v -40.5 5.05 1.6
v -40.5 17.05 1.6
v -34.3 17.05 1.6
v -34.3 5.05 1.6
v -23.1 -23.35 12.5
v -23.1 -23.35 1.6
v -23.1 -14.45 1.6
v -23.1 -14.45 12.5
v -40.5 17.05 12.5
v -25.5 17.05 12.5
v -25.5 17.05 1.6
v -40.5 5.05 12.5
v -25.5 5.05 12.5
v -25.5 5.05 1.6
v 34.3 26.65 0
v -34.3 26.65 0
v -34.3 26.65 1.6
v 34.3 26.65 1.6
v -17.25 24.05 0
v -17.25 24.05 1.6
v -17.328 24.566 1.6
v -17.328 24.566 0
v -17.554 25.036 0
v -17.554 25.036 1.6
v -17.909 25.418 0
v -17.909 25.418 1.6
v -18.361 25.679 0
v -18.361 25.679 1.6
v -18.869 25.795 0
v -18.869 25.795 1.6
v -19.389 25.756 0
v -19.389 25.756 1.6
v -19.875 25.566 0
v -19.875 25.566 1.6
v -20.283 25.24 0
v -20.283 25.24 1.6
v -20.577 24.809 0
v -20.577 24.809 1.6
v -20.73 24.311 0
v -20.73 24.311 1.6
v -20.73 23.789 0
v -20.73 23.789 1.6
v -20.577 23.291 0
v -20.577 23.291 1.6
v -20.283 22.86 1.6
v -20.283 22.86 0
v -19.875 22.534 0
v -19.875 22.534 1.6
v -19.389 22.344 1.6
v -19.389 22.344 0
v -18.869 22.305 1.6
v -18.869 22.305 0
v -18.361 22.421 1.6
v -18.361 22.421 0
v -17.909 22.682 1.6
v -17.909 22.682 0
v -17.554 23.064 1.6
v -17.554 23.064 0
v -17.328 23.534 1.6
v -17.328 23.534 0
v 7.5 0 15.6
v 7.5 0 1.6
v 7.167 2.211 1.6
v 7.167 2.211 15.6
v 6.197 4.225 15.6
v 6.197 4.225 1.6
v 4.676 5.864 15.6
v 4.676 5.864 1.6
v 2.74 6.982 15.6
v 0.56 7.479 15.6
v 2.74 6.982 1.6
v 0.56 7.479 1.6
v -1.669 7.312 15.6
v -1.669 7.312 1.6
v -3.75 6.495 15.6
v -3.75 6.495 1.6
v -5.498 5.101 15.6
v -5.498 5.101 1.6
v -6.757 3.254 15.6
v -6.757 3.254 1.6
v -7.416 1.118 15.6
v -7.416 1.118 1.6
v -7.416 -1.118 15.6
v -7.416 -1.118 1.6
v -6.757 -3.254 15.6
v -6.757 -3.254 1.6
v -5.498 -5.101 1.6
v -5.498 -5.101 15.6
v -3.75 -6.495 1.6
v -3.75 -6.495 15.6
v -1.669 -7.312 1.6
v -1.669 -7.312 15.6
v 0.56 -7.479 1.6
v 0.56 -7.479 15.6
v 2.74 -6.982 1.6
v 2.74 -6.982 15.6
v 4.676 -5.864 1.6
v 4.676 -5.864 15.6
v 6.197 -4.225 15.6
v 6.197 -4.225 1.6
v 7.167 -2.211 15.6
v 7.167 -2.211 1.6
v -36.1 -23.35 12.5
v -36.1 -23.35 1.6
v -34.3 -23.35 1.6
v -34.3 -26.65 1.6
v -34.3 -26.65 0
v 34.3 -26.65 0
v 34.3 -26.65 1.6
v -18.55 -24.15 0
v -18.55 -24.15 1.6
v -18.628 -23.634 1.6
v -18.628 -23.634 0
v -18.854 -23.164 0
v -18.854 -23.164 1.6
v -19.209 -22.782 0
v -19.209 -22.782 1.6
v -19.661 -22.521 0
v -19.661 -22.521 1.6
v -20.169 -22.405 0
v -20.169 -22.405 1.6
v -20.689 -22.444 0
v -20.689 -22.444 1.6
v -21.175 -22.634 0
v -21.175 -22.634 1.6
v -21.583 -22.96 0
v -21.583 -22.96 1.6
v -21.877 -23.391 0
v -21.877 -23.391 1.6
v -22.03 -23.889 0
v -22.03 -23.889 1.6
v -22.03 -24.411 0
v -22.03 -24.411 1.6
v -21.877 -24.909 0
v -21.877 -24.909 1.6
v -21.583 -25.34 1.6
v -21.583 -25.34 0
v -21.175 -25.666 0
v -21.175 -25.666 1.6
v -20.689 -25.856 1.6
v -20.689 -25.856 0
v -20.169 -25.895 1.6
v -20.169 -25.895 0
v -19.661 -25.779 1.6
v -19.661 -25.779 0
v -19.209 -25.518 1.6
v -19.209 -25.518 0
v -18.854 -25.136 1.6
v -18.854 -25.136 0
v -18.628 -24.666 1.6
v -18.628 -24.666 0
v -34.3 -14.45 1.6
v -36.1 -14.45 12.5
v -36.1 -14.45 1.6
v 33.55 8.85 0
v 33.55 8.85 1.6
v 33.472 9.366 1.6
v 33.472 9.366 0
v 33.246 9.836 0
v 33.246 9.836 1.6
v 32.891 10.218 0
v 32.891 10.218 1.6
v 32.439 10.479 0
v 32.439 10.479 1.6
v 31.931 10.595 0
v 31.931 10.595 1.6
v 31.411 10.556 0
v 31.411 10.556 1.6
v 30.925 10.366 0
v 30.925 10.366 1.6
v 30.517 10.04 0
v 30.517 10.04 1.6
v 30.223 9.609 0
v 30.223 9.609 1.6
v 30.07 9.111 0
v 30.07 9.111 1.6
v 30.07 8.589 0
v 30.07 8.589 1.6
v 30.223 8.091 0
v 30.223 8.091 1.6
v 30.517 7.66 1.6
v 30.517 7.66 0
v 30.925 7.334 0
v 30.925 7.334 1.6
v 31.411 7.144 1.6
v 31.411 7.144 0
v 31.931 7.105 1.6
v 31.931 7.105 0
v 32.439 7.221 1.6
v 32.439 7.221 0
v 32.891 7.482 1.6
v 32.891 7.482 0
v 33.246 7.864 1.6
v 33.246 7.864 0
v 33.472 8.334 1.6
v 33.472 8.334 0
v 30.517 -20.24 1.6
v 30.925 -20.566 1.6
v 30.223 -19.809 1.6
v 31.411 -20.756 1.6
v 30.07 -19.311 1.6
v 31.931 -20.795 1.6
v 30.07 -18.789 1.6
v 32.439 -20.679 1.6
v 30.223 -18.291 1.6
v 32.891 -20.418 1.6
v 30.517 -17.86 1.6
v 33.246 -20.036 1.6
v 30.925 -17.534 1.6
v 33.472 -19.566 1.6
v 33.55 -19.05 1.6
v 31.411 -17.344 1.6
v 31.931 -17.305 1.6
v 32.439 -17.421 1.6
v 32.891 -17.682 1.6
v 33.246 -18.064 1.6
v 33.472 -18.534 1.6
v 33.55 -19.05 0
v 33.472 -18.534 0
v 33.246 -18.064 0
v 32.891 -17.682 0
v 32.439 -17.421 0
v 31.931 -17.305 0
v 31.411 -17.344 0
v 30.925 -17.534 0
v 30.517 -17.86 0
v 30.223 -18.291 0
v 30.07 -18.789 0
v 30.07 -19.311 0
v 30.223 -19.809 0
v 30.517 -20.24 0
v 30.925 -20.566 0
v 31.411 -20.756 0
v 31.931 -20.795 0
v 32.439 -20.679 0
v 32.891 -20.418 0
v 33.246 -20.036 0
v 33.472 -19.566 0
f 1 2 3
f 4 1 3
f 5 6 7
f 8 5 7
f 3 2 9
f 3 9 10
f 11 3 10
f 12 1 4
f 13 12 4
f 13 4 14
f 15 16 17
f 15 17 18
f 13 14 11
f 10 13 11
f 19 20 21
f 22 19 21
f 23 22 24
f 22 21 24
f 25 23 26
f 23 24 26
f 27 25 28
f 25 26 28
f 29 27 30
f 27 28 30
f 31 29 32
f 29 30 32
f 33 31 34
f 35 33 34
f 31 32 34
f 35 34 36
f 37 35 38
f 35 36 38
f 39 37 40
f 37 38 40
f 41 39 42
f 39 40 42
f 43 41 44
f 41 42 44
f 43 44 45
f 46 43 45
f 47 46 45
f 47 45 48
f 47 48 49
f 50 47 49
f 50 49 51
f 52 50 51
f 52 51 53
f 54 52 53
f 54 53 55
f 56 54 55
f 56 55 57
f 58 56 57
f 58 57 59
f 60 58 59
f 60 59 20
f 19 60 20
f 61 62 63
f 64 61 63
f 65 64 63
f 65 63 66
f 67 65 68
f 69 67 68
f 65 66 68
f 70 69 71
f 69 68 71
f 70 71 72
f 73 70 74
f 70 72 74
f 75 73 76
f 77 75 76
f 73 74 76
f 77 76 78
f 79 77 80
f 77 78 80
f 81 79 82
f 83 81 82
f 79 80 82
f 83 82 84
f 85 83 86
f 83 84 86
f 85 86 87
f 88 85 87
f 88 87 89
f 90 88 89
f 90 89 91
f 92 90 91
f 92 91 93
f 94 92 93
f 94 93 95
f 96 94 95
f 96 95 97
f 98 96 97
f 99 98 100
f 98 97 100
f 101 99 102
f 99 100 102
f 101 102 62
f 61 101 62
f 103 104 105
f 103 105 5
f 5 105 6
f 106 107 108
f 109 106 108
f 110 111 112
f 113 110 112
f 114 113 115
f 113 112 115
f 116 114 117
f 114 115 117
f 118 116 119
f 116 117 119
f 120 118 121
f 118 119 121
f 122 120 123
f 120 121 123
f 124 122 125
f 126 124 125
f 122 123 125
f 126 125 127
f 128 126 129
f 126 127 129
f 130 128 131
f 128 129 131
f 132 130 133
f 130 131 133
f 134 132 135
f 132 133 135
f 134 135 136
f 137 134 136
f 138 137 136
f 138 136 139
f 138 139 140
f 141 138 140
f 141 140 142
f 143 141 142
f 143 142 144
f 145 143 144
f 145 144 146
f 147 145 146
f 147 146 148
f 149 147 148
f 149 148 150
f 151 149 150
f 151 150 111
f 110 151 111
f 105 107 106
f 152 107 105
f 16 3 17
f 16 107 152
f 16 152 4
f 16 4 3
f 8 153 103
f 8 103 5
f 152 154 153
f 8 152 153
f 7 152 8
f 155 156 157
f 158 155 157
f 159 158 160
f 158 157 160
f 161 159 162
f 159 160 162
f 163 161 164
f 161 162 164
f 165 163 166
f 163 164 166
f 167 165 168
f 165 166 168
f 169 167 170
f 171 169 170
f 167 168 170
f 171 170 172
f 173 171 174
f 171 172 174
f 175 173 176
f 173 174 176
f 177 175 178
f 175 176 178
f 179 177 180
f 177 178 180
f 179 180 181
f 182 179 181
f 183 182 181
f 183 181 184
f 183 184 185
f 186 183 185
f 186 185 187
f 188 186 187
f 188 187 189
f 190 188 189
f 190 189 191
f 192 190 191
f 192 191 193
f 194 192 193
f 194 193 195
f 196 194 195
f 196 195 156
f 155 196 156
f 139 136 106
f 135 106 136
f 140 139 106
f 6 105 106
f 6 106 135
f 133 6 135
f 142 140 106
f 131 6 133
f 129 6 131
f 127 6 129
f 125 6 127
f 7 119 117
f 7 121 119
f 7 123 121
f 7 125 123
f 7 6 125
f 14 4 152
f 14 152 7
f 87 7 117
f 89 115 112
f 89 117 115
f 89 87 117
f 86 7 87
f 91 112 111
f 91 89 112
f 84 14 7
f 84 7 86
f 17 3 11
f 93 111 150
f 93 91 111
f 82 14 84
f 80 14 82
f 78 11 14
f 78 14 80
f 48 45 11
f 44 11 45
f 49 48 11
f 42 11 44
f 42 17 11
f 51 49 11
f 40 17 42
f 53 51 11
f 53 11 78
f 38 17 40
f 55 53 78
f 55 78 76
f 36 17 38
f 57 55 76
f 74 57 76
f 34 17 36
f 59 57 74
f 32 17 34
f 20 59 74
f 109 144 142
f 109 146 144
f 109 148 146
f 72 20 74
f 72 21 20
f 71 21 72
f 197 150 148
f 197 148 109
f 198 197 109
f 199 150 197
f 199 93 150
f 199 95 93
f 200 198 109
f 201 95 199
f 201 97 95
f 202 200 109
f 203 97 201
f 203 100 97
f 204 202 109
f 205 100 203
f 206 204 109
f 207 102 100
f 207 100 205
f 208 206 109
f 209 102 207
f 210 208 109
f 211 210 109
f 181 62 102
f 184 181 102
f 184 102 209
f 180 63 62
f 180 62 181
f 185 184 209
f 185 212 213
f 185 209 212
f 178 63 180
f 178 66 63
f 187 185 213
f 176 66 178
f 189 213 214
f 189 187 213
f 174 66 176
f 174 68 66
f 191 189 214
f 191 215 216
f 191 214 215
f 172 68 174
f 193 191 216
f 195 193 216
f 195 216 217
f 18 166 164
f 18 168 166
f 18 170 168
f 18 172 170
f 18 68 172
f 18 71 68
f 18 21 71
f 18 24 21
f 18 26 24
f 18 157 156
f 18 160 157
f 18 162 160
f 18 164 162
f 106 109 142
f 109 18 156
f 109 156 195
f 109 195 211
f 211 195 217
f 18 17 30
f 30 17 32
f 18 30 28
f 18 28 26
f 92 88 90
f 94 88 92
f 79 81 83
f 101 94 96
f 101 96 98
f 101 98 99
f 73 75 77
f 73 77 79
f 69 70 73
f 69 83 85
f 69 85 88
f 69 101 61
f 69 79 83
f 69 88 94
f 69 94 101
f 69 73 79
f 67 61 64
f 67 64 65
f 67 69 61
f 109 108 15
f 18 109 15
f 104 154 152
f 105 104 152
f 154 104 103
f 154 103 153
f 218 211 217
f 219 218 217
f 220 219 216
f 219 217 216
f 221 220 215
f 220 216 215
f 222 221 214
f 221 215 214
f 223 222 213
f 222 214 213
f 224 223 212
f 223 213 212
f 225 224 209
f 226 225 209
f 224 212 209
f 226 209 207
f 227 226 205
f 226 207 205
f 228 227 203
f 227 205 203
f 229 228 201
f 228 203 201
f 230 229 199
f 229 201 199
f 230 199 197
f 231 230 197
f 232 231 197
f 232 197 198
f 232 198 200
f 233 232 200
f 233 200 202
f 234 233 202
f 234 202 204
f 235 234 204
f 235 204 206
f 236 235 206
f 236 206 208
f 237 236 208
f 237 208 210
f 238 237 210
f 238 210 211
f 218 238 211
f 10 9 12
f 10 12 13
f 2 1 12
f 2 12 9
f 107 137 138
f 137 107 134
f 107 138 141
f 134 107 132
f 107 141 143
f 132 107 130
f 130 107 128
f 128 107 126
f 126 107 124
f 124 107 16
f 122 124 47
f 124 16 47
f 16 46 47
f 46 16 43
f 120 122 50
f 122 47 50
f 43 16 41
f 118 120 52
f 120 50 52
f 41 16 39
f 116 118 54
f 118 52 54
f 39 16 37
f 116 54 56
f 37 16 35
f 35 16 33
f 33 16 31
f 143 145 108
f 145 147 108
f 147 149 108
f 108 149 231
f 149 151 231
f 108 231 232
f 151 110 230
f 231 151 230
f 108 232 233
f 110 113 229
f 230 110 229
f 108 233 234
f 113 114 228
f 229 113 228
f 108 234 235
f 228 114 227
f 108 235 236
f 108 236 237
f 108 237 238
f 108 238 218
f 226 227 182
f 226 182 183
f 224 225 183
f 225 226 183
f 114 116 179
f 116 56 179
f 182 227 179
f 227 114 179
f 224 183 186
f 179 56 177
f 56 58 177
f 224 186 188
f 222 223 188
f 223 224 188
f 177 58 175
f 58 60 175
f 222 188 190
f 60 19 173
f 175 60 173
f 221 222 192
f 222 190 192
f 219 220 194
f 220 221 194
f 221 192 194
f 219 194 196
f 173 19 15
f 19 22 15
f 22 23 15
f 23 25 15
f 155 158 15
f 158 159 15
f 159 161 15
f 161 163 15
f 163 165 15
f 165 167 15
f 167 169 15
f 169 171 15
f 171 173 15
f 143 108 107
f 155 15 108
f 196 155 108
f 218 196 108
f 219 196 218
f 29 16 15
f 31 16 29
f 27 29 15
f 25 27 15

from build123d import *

# Parameters (mm, degrees)
SKETCH1_W           = 68.6
SKETCH1_H           = 53.3
BOSS_EXTRUDE1_DEPTH = 1.6
SKETCH2_W           = 15
SKETCH2_H           = 12
SKETCH2_W_2         = 13
SKETCH2_H_2         = 8.9
BOSS_EXTRUDE2_DEPTH = 10.9
SKETCH3_R           = 1.75
CUT_EXTRUDE1_DEPTH  = 2.6
SKETCH4_R           = 7.5
BOSS_EXTRUDE3_DEPTH = 14


with BuildPart() as part:
    # Sketch1 → Boss-Extrude1 (new body)
    with BuildSketch(Plane.XY):
        Rectangle(SKETCH1_W, SKETCH1_H)
    extrude(amount=BOSS_EXTRUDE1_DEPTH)

    # Sketch2 → Boss-Extrude2 (add)
    with BuildSketch(Plane.XY.offset(1.6)):
        with Locations((-33, 11.05)):
            Rectangle(SKETCH2_W, SKETCH2_H)
        with Locations((-29.6, -18.9)):
            Rectangle(SKETCH2_W_2, SKETCH2_H_2)
    extrude(amount=BOSS_EXTRUDE2_DEPTH)

    # Sketch3 → Cut-Extrude1 (cut, through all)
    with BuildSketch(Plane.XY.offset(1.6)):
        with Locations((-19, 24.05)):
            Circle(SKETCH3_R)
        with Locations((-20.3, -24.15)):
            Circle(SKETCH3_R)
        with Locations((31.8, -19.05)):
            Circle(SKETCH3_R)
        with Locations((31.8, 8.85)):
            Circle(SKETCH3_R)
    extrude(amount=-CUT_EXTRUDE1_DEPTH, mode=Mode.SUBTRACT)

    # Sketch4 → Boss-Extrude3 (add)
    with BuildSketch(Plane.XY.offset(1.6)):
        Circle(SKETCH4_R)
    extrude(amount=BOSS_EXTRUDE3_DEPTH)


solid = part.part
